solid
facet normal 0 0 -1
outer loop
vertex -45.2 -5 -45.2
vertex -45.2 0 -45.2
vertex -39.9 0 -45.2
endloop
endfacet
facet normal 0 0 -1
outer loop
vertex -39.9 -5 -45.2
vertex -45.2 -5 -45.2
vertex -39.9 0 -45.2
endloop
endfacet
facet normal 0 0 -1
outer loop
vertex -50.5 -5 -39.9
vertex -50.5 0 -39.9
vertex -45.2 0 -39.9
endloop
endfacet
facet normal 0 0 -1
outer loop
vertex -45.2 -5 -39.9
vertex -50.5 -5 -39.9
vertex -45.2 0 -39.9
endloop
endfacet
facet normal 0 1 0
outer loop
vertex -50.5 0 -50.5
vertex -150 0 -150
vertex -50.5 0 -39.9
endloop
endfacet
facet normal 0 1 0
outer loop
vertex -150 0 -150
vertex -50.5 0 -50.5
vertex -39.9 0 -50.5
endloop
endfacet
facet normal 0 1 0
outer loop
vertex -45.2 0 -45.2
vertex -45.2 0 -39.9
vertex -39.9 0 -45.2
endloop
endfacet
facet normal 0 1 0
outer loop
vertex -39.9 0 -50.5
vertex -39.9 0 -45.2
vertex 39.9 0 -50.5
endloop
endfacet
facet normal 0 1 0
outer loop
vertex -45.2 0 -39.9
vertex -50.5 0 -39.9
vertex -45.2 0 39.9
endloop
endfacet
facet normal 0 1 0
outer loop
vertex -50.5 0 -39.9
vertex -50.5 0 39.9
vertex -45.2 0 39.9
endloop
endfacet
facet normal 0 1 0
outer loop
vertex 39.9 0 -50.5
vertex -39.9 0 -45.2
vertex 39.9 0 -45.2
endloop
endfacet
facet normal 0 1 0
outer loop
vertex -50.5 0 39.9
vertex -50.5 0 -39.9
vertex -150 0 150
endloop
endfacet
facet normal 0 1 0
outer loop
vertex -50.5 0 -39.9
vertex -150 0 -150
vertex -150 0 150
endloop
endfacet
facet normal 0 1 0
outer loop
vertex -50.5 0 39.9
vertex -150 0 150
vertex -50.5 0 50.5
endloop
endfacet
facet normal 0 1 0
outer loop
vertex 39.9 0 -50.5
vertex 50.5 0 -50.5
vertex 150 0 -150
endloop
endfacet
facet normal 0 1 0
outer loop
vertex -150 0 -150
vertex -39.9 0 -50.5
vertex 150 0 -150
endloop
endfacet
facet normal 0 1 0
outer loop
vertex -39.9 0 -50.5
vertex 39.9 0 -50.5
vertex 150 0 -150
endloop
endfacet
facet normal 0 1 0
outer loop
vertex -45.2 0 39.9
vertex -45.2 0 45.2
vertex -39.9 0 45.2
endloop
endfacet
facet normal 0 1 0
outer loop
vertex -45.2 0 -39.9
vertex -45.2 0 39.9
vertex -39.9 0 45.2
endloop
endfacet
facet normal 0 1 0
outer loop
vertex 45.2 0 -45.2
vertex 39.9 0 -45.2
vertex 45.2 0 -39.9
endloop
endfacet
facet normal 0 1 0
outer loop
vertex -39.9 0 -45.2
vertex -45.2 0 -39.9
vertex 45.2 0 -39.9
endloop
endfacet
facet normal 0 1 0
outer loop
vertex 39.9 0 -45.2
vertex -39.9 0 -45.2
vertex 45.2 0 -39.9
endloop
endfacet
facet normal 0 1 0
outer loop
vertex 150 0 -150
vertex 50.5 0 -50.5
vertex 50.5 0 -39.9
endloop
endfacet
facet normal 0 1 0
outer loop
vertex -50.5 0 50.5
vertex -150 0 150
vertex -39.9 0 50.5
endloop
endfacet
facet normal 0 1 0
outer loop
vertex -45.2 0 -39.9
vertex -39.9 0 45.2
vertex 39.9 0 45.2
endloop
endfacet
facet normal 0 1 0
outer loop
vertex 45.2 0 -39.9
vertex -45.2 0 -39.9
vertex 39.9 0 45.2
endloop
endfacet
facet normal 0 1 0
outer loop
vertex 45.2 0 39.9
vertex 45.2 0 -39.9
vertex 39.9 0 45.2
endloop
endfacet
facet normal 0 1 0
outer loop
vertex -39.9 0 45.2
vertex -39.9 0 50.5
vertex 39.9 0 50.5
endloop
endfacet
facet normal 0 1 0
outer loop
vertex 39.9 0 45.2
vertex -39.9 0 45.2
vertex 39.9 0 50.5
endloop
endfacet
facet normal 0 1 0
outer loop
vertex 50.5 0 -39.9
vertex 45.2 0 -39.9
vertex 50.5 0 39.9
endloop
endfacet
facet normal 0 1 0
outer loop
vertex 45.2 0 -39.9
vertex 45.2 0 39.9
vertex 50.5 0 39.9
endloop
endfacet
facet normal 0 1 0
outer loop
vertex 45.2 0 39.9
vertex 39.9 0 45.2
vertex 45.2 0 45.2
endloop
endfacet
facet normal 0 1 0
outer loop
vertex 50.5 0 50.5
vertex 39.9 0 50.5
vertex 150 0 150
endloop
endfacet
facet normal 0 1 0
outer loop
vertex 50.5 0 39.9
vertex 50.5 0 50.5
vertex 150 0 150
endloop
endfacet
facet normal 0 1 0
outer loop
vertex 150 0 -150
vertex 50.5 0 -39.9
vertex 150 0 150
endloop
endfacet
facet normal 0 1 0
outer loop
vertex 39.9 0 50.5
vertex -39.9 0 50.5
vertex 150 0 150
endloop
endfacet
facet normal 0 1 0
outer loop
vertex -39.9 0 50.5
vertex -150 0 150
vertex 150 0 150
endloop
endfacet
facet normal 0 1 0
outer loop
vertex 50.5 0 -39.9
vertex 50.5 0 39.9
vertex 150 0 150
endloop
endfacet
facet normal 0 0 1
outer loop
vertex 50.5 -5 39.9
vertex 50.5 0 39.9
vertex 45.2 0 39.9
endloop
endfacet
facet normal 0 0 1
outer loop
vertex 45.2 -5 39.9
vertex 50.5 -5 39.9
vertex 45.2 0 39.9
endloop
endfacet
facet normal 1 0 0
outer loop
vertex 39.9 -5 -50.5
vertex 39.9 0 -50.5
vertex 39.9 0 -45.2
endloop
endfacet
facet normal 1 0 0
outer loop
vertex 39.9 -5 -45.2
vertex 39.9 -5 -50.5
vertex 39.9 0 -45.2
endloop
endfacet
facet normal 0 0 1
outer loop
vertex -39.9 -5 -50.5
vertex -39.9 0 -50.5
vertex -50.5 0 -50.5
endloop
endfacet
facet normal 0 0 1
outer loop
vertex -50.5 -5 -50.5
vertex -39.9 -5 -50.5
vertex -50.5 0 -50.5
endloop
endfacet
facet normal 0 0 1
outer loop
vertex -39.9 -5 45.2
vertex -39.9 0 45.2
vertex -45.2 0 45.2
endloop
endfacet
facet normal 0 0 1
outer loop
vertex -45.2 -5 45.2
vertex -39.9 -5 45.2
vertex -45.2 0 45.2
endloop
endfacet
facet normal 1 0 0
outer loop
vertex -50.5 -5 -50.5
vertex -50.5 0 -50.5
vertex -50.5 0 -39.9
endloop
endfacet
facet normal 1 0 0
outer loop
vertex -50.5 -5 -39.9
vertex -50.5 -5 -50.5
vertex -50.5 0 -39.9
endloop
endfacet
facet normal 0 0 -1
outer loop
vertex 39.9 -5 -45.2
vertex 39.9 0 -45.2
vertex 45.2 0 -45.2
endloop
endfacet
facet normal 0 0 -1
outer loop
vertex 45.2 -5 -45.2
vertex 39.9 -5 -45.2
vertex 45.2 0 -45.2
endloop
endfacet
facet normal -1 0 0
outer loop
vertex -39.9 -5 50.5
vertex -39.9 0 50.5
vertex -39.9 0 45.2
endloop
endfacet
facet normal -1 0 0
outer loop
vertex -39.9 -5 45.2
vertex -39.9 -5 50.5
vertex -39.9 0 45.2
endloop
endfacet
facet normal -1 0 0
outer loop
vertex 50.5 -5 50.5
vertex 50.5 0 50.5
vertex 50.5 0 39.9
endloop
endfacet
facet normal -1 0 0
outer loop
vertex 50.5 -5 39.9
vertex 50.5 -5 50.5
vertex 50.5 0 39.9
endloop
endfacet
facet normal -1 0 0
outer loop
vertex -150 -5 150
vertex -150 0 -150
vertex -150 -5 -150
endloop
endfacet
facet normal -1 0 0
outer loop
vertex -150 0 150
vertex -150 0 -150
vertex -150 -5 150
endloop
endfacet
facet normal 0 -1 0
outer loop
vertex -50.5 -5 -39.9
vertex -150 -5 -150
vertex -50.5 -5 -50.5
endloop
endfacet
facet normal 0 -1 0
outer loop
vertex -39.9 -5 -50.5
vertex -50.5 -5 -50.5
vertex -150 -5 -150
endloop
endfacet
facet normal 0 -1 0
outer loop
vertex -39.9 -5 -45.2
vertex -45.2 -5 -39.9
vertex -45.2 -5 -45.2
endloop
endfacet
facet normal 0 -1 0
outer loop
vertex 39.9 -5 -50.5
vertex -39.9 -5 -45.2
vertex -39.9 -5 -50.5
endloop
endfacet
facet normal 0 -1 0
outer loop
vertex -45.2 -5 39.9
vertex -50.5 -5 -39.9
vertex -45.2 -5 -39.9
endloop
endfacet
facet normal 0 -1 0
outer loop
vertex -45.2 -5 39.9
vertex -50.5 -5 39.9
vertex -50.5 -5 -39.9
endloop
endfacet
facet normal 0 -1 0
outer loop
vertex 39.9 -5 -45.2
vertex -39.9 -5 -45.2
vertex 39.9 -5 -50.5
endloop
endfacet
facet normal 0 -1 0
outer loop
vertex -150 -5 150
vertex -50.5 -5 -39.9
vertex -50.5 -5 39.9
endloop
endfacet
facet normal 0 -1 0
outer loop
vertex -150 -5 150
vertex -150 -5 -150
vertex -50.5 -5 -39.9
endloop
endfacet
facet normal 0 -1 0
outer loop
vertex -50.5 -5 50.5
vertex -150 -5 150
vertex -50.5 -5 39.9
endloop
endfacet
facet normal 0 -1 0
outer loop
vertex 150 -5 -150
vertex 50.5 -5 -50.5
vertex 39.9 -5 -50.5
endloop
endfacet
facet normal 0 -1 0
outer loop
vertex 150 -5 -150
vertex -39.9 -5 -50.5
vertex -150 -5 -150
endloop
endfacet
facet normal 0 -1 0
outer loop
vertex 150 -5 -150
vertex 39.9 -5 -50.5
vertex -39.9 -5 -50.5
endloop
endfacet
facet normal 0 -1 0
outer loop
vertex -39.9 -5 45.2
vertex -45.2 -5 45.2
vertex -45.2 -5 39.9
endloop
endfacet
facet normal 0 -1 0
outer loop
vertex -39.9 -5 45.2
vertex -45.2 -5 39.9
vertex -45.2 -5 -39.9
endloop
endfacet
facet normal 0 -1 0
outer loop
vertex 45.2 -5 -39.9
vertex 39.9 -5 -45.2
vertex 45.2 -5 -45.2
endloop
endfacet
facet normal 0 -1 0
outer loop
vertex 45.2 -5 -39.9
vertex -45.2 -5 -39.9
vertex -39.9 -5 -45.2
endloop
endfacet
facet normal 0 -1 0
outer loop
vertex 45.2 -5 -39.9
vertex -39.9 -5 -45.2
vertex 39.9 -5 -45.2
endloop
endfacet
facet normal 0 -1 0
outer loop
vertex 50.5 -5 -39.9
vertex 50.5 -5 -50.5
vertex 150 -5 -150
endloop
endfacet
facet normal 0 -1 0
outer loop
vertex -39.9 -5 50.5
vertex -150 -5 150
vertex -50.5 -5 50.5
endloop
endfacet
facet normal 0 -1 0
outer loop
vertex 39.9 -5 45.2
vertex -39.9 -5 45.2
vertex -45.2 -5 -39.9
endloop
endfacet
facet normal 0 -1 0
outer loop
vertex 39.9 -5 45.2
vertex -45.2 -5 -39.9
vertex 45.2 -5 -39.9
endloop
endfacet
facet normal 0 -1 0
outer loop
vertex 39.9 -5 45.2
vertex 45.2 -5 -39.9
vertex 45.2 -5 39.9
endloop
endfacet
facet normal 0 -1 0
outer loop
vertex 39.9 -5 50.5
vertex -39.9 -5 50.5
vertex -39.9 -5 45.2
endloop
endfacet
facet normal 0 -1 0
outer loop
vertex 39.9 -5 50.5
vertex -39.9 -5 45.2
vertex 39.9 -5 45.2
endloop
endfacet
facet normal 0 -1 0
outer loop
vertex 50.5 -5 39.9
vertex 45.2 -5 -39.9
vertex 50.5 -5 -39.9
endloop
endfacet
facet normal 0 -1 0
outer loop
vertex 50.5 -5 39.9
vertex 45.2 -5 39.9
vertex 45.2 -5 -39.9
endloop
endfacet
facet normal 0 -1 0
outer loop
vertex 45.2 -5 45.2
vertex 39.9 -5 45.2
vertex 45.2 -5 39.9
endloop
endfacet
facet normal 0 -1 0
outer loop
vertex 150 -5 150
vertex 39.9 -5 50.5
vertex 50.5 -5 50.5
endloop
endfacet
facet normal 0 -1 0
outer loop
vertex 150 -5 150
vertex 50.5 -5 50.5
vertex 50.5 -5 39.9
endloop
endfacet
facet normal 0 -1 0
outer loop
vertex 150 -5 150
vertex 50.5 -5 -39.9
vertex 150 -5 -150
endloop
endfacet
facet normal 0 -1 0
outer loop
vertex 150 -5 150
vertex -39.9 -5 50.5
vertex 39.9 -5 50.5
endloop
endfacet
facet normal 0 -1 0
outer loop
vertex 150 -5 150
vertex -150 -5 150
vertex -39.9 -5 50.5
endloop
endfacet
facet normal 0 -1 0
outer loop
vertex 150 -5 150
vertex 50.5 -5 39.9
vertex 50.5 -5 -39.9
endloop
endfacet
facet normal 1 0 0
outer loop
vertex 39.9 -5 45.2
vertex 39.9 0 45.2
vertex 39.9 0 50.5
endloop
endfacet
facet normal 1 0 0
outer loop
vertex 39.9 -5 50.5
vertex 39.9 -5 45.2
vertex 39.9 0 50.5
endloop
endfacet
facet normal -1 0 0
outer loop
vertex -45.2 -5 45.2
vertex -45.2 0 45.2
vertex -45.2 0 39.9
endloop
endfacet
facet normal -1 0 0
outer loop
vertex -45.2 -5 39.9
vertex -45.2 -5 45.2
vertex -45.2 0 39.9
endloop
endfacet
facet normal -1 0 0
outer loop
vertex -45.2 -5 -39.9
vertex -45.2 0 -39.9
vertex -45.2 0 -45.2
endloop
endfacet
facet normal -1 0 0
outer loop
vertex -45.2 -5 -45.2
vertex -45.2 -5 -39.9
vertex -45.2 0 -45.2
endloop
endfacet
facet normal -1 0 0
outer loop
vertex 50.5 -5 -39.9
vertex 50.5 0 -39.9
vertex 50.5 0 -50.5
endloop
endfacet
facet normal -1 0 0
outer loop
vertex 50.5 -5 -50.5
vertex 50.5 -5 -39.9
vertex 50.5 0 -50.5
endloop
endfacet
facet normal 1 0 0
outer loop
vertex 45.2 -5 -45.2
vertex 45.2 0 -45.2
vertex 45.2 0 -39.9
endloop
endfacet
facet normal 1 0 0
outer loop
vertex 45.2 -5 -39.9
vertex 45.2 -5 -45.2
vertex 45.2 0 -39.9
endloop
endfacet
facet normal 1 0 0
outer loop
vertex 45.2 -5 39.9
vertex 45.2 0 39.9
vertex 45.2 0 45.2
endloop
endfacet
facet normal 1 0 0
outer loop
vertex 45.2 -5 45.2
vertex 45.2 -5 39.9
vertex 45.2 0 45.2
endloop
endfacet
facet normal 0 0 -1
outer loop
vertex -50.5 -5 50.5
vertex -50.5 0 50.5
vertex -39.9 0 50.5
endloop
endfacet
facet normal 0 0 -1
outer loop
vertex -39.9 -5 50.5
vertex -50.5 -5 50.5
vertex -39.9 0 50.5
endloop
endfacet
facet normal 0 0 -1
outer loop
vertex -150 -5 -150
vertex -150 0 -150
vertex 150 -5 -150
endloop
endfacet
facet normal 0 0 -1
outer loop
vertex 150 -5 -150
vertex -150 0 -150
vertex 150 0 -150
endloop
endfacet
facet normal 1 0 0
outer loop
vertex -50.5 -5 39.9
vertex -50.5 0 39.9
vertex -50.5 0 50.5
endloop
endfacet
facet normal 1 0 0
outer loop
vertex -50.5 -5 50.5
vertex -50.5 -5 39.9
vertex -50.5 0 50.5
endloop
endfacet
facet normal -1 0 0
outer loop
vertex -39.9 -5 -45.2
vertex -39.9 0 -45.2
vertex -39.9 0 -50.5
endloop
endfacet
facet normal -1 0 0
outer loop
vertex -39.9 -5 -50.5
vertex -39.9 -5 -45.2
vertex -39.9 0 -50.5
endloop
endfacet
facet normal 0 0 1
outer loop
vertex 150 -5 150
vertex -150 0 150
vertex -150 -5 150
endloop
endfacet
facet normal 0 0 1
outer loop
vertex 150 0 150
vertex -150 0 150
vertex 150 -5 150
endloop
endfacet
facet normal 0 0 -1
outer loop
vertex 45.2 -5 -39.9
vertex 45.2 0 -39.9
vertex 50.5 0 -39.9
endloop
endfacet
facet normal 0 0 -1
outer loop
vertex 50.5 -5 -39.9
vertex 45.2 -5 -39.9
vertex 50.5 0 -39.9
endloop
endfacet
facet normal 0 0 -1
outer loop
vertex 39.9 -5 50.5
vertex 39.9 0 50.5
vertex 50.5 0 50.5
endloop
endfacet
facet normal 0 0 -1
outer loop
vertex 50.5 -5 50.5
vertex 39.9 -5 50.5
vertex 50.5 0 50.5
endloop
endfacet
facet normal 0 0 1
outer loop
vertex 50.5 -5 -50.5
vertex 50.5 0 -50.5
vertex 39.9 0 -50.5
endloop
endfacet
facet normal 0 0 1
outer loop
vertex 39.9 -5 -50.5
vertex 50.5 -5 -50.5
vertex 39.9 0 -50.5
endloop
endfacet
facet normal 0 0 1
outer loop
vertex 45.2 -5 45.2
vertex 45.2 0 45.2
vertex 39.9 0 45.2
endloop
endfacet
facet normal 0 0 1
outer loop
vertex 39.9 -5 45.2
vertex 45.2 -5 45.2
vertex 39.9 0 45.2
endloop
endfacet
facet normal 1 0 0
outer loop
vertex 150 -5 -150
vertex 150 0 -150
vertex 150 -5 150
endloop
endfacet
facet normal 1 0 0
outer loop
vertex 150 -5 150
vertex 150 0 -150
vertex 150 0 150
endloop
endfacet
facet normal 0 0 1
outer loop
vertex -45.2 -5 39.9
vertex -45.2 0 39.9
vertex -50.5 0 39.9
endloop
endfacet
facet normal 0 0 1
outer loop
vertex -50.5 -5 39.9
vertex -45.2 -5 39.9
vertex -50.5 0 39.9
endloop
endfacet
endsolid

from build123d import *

# Parameters (mm, degrees)
F0_W     = 300
F0_H     = 300
F1_DEPTH = 5


with BuildPart() as f1:
    # F0 (on Front) → F1 (new body)
    with BuildSketch(Plane.XZ):
        Rectangle(F0_W, F0_H)
        Polygon((-45.2, -50.5), (-50.5, -50.5), (-50.5, -45.2), (-50.5, -39.9), (-45.2, -39.9), (-45.2, -45.2), (-39.9, -45.2), (-39.9, -50.5), align=None, mode=Mode.SUBTRACT)
        Polygon((45.2, -50.5), (39.9, -50.5), (39.9, -45.2), (45.2, -45.2), (45.2, -39.9), (50.5, -39.9), (50.5, -45.2), (50.5, -50.5), align=None, mode=Mode.SUBTRACT)
        Polygon((-50.5, 45.2), (-50.5, 50.5), (-45.2, 50.5), (-39.9, 50.5), (-39.9, 45.2), (-45.2, 45.2), (-45.2, 39.9), (-50.5, 39.9), align=None, mode=Mode.SUBTRACT)
        Polygon((45.2, 50.5), (50.5, 50.5), (50.5, 45.2), (50.5, 39.9), (45.2, 39.9), (45.2, 45.2), (39.9, 45.2), (39.9, 50.5), align=None, mode=Mode.SUBTRACT)
    extrude(amount=F1_DEPTH)


solid = f1.part
